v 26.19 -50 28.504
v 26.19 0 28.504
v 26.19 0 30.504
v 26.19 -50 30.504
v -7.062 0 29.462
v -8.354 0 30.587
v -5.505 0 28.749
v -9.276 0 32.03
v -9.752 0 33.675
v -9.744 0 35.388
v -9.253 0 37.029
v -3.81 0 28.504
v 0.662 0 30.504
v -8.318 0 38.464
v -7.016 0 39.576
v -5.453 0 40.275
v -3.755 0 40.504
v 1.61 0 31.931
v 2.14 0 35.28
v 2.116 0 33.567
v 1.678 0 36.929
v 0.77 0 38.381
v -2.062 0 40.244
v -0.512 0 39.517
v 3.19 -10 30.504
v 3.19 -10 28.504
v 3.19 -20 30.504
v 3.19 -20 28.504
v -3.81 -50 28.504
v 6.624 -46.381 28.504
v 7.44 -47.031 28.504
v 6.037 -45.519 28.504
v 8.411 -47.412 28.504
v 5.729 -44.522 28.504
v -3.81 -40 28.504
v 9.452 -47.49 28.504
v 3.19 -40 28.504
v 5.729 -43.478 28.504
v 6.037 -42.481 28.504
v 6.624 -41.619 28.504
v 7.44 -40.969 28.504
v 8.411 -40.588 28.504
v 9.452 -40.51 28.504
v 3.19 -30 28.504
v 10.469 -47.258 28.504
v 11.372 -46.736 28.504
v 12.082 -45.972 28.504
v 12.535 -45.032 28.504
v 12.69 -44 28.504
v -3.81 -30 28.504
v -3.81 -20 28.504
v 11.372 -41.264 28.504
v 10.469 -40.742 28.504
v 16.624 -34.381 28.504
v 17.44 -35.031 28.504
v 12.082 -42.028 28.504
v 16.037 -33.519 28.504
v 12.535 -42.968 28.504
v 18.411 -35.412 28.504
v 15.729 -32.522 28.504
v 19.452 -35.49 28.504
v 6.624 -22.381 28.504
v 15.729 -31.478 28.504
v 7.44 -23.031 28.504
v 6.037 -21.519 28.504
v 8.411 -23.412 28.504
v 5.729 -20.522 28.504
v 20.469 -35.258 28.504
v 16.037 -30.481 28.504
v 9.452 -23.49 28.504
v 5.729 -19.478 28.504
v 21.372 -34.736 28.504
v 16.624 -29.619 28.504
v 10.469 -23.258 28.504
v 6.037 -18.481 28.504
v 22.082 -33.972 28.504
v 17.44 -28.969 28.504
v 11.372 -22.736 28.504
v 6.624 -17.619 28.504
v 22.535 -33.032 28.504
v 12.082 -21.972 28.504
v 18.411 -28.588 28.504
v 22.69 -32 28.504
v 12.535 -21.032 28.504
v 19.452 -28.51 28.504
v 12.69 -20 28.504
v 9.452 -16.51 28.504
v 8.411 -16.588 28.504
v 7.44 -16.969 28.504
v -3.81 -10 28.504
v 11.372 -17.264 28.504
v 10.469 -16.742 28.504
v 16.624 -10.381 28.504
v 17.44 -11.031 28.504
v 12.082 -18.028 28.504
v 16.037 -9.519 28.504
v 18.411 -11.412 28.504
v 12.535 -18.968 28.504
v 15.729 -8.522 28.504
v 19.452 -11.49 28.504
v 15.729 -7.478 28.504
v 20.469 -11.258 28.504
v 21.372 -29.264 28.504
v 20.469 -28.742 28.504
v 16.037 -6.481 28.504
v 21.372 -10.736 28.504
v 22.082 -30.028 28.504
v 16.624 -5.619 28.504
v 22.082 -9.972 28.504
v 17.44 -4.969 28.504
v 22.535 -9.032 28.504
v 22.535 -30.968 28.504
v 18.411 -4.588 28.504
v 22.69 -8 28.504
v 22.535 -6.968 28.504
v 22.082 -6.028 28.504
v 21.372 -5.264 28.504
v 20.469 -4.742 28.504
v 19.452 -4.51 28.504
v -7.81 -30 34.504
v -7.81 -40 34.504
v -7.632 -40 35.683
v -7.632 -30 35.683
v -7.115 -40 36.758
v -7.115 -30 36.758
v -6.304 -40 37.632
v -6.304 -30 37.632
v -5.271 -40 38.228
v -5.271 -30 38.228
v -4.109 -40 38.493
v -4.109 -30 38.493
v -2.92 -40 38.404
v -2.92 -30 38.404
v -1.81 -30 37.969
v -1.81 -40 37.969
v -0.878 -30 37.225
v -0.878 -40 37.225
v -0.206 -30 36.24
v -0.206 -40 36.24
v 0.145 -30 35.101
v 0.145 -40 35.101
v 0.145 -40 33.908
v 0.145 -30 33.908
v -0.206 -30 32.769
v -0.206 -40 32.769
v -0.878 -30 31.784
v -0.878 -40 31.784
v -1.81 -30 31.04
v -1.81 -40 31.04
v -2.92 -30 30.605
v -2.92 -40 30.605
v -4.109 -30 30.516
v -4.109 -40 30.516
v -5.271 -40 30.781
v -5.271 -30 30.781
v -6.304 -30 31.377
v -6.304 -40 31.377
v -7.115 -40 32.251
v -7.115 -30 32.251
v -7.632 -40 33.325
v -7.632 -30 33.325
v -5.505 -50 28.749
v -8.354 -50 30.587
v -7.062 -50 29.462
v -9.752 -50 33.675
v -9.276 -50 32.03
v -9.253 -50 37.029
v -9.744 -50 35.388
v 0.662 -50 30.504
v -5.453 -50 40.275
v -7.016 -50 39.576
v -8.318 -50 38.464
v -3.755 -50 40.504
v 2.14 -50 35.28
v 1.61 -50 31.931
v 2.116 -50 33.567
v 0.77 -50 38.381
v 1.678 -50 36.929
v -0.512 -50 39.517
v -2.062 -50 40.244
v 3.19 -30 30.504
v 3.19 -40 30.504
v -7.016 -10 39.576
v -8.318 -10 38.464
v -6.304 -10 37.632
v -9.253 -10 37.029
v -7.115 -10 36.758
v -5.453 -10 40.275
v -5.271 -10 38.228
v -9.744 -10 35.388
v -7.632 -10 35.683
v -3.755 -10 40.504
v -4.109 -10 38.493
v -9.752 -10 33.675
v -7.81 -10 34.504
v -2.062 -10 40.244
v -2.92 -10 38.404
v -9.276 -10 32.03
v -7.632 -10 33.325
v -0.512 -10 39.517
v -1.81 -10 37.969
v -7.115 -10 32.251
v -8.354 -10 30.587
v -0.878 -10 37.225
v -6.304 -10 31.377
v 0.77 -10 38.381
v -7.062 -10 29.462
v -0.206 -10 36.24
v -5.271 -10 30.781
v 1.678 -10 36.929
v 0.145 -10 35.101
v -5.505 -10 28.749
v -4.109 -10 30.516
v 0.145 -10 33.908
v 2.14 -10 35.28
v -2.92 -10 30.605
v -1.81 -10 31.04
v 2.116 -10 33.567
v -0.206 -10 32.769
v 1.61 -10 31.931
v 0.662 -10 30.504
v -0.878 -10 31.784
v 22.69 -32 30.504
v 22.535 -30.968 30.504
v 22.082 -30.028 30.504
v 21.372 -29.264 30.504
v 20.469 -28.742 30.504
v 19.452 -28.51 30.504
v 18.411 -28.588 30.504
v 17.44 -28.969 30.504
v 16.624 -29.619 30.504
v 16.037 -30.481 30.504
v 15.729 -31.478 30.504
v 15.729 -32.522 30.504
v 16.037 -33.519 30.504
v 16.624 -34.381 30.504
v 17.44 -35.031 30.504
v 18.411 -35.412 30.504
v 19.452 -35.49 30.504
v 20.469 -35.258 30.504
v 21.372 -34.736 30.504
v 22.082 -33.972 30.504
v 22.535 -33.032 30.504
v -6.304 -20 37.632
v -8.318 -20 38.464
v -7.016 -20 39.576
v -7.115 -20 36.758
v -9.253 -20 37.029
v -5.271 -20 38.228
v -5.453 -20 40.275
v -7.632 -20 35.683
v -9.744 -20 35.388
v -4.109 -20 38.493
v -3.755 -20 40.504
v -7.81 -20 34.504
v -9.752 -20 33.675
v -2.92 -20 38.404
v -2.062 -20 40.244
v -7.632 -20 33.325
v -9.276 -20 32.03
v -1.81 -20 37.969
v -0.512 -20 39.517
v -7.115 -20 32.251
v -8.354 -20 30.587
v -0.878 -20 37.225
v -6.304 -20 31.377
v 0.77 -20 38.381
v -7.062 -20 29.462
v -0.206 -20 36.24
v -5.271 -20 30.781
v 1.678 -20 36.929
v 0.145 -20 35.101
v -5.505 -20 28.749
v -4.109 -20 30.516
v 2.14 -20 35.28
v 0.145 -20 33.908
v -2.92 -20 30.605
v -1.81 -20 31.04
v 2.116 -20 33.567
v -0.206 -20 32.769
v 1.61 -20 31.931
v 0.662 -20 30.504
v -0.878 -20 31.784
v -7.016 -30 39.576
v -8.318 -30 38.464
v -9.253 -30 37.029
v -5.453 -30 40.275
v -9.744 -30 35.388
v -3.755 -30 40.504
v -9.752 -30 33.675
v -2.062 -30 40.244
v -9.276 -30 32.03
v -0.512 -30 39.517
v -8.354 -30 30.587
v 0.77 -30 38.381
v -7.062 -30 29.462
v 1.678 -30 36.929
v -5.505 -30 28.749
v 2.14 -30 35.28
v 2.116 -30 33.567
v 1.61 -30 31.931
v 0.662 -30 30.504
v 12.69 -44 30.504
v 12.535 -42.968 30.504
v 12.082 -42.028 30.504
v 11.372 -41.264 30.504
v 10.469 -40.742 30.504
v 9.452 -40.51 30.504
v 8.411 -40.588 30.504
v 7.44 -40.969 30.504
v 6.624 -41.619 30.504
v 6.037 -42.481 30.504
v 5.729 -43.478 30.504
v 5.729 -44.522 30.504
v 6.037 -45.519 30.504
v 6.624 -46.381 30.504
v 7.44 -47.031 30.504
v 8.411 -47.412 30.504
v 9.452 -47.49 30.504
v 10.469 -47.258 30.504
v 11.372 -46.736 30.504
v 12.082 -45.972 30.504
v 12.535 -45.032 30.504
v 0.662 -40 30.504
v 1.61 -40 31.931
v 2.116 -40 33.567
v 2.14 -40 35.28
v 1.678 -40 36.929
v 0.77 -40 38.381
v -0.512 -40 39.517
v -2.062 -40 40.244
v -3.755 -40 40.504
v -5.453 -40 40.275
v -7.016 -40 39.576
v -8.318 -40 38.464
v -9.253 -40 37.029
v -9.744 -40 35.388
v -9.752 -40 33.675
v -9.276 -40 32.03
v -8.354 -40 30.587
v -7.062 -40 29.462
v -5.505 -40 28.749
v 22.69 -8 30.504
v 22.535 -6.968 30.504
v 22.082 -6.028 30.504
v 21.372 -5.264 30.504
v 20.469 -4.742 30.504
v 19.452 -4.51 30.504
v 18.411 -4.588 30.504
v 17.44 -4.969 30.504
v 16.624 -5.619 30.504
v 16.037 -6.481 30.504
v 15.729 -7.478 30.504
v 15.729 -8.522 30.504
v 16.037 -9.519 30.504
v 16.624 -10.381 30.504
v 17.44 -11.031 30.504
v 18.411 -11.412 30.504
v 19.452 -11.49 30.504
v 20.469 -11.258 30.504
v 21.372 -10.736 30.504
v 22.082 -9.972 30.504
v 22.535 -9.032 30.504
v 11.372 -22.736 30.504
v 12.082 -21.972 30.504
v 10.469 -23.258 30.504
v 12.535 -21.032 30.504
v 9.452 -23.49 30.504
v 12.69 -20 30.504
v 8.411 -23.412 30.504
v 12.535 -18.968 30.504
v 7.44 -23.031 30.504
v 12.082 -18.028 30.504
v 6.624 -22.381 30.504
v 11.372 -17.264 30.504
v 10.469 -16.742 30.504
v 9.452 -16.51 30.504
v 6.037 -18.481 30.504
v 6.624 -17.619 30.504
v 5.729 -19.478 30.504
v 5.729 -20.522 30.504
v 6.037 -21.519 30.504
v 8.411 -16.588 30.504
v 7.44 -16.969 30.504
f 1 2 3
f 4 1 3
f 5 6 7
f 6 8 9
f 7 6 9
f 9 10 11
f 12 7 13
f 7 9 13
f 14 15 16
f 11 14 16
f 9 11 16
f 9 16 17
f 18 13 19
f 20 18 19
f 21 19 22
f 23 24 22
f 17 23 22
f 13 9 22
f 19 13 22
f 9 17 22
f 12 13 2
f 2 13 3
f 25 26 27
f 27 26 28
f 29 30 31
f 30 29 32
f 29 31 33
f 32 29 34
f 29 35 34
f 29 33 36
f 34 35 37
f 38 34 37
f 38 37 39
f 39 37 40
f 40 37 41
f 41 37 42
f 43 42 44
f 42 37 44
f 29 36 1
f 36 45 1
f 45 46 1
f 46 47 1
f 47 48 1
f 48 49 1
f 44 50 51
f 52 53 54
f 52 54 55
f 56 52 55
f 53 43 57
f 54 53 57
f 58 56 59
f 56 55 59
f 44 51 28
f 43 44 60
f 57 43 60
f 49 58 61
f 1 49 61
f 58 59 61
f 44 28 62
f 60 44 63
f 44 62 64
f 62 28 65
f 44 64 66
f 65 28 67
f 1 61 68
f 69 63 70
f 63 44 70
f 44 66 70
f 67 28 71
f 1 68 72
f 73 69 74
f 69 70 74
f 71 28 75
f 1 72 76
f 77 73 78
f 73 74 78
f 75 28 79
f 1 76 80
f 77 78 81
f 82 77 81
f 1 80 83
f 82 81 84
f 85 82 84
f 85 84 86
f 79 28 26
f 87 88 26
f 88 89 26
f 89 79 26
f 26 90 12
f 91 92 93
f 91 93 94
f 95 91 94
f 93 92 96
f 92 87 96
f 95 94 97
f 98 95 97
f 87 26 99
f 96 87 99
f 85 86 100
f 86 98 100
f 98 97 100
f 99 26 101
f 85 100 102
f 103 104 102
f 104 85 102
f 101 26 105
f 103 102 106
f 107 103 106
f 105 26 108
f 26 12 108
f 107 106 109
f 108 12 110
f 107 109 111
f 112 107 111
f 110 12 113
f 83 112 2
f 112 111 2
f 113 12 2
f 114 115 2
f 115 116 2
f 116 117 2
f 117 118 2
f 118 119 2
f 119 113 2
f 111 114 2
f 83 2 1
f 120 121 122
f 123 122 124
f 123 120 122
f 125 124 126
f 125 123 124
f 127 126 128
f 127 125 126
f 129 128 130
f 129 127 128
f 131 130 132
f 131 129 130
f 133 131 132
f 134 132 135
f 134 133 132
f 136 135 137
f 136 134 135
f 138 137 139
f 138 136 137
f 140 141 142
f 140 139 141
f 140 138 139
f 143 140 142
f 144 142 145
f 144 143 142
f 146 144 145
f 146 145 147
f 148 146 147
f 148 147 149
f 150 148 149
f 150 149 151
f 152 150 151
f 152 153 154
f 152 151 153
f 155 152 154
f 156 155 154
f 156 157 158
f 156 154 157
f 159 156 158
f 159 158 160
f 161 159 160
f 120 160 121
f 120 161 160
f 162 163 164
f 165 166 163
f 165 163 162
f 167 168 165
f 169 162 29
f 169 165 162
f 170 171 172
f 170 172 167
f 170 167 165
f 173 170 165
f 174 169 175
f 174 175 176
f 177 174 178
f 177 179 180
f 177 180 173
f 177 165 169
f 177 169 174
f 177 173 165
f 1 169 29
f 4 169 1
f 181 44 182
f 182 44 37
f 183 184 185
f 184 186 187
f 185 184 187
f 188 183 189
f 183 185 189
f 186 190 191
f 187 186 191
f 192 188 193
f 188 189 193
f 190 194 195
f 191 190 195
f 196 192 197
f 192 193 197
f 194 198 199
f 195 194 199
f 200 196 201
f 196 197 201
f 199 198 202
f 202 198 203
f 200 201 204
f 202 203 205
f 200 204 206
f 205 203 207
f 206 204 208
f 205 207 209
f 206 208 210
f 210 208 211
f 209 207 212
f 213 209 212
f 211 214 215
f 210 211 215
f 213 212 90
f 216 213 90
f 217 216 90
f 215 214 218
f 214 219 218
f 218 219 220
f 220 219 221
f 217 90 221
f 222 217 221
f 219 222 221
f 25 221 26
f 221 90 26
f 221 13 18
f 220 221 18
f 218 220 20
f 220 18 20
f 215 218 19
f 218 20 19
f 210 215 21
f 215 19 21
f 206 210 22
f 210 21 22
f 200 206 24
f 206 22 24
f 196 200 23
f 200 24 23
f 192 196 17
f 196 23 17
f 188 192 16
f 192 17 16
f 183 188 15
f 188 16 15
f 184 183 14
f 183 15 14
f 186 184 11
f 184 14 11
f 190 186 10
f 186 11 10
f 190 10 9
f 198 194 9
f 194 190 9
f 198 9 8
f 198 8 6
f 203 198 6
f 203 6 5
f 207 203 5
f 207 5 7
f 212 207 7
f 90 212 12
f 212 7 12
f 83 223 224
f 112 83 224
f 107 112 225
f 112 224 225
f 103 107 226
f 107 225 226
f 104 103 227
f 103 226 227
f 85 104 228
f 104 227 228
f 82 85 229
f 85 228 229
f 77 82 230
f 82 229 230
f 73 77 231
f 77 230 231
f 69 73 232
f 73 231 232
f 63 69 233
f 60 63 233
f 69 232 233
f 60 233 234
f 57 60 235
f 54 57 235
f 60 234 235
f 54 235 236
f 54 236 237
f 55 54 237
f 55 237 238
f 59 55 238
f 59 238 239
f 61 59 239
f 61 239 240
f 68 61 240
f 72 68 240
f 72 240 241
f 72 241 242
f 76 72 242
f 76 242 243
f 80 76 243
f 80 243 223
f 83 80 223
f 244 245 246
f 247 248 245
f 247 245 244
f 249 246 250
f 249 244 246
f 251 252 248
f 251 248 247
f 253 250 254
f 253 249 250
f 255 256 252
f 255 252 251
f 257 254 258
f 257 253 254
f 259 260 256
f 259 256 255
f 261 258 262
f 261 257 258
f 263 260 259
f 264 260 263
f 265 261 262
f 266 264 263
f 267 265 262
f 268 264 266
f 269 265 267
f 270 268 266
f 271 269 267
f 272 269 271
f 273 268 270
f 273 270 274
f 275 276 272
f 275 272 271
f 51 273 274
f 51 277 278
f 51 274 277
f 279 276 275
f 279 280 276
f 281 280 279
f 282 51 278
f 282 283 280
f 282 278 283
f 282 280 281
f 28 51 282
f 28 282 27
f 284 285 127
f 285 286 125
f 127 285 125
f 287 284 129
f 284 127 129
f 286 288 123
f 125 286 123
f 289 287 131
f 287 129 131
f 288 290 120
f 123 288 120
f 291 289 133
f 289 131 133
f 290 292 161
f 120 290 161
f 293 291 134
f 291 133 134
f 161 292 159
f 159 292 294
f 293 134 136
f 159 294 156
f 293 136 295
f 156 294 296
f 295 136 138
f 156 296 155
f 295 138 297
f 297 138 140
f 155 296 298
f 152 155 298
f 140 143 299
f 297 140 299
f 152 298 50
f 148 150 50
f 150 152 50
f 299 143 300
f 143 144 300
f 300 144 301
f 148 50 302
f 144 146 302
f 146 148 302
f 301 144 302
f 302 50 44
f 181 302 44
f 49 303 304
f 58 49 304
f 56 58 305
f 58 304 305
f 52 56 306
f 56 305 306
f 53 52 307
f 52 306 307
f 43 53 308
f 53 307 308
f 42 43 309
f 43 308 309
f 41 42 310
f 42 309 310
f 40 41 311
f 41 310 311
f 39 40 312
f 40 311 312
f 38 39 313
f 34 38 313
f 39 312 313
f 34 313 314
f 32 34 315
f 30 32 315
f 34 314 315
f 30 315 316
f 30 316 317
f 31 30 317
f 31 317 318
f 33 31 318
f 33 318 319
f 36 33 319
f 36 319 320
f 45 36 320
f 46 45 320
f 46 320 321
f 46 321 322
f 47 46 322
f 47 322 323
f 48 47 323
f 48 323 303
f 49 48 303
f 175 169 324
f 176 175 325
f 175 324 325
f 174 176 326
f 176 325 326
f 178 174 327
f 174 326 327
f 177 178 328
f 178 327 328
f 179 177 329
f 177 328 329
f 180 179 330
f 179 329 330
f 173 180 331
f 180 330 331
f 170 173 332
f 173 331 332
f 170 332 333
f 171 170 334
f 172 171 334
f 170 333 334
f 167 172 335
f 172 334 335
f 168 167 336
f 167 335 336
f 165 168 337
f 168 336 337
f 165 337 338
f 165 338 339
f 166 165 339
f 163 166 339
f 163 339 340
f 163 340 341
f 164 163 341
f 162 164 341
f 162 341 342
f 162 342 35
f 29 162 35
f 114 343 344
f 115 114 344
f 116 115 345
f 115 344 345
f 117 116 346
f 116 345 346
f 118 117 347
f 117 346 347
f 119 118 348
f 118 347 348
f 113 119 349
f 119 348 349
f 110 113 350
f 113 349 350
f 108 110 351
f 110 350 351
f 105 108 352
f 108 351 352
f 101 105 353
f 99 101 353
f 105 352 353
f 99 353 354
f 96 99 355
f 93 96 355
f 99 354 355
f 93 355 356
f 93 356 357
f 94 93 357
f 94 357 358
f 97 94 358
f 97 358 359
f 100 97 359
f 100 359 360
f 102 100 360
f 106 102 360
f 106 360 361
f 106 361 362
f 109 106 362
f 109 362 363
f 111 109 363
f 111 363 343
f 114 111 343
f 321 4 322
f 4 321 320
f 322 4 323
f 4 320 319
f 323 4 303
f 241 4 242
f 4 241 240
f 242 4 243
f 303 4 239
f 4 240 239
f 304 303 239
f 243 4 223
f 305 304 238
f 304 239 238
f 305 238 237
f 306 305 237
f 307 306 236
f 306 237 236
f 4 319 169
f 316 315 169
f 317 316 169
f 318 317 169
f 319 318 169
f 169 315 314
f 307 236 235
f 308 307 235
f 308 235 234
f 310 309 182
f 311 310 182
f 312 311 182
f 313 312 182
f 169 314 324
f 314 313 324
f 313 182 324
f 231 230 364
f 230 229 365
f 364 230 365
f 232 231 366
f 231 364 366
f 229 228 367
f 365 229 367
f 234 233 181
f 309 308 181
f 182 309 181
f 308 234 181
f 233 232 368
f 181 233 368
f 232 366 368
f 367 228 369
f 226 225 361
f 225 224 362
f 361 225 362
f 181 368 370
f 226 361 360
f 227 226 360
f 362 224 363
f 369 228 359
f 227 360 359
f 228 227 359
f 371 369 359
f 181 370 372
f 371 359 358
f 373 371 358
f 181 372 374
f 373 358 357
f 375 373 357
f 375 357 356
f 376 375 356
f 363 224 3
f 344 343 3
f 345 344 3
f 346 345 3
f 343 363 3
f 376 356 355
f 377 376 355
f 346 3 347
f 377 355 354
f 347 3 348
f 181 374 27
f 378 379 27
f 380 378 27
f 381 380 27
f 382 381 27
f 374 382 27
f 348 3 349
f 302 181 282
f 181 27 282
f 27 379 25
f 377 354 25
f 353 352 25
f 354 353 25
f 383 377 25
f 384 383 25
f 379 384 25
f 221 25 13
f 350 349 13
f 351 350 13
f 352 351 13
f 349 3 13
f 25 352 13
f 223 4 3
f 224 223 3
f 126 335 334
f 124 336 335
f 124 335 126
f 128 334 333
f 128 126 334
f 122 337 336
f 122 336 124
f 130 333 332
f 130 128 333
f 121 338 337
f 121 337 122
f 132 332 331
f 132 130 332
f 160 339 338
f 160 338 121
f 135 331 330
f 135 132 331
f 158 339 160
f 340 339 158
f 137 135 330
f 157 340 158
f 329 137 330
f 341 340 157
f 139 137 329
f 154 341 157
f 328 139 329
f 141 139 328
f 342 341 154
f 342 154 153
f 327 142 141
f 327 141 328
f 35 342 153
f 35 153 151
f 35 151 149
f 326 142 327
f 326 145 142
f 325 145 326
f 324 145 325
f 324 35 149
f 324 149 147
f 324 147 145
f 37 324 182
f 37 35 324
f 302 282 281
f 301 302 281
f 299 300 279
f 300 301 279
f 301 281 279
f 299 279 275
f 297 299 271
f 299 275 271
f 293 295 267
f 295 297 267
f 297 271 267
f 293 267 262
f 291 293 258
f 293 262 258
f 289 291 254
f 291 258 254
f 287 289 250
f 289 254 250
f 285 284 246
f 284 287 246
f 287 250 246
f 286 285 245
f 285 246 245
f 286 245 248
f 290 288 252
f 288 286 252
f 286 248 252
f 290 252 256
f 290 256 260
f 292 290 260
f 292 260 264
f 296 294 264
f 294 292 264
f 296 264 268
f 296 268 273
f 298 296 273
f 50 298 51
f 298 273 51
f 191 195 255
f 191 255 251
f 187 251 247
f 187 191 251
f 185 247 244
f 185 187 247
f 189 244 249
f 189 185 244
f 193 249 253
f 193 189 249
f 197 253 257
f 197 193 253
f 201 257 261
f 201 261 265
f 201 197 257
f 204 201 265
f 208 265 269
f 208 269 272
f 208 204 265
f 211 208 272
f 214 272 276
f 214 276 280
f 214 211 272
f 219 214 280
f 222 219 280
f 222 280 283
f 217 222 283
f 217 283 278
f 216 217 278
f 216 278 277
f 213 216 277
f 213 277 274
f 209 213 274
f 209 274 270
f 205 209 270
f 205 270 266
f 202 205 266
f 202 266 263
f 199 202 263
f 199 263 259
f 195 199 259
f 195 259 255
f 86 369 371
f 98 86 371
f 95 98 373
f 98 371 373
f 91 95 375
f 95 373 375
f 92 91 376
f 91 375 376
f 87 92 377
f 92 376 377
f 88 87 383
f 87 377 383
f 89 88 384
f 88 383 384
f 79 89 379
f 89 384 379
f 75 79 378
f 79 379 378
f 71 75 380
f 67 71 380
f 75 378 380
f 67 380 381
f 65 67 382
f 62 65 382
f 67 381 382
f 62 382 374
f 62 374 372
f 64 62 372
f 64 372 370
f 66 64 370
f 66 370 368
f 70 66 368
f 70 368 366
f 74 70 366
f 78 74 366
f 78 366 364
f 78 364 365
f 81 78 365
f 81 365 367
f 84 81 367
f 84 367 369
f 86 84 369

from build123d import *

# Parameters (mm, degrees)
F0_R     = 4
F1_DEPTH = 50
F2_R     = 3.5
F3_DEPTH = 2.001
F4_W     = 15
F4_H     = 10
F5_DEPTH = 25
F6_R     = 4
F7_DEPTH = 50


with BuildPart() as f1:
    # F0 (on Front) → F1 (new body)
    with BuildSketch(Plane.XZ):
        with BuildLine():
            Line((26.190159, 30.504479), (0.662295, 30.504479))
            ThreePointArc((0.662295, 30.504479), (-6.259331, 39.981705), (-3.809841, 28.504479))
            Line((-3.809841, 28.504479), (26.190159, 28.504479))
            Line((26.190159, 28.504479), (26.190159, 30.504479))
        make_face()
        with Locations((-3.809841, 34.504479)):
            Circle(F0_R, mode=Mode.SUBTRACT)
    extrude(amount=F1_DEPTH)

    # F2 (on face) → F3 (cut, through all)
    with BuildSketch(Plane.XY.offset(30.504479)):
        with Locations((19.190159, -32)):
            Circle(F2_R)
        with Locations((9.190159, -44)):
            Circle(F2_R)
        with Locations((9.190159, -20)):
            Circle(F2_R)
        with Locations((19.190159, -8)):
            Circle(F2_R)
    extrude(amount=-F3_DEPTH, mode=Mode.SUBTRACT)

    # F4 (on face) → F5 (cut)
    with BuildSketch(Plane(origin=(0, 0, 28.504479), x_dir=(1, 0, 0), z_dir=(0, 0, -1))):
        with Locations((-4.309841, 35)):
            Rectangle(F4_W, F4_H)
        with Locations((-4.309841, 15)):
            Rectangle(F4_W, F4_H)
    extrude(amount=-F5_DEPTH, mode=Mode.SUBTRACT)

    # F6 (on face) → F7 (join)
    with BuildSketch(Plane(origin=(0, 0, 0), x_dir=(-1, 0, 0), z_dir=(0, 1, 0))):
        with Locations((3.809841, 34.504479)):
            Circle(F6_R)
    extrude(amount=-F7_DEPTH)


solid = f1.part
